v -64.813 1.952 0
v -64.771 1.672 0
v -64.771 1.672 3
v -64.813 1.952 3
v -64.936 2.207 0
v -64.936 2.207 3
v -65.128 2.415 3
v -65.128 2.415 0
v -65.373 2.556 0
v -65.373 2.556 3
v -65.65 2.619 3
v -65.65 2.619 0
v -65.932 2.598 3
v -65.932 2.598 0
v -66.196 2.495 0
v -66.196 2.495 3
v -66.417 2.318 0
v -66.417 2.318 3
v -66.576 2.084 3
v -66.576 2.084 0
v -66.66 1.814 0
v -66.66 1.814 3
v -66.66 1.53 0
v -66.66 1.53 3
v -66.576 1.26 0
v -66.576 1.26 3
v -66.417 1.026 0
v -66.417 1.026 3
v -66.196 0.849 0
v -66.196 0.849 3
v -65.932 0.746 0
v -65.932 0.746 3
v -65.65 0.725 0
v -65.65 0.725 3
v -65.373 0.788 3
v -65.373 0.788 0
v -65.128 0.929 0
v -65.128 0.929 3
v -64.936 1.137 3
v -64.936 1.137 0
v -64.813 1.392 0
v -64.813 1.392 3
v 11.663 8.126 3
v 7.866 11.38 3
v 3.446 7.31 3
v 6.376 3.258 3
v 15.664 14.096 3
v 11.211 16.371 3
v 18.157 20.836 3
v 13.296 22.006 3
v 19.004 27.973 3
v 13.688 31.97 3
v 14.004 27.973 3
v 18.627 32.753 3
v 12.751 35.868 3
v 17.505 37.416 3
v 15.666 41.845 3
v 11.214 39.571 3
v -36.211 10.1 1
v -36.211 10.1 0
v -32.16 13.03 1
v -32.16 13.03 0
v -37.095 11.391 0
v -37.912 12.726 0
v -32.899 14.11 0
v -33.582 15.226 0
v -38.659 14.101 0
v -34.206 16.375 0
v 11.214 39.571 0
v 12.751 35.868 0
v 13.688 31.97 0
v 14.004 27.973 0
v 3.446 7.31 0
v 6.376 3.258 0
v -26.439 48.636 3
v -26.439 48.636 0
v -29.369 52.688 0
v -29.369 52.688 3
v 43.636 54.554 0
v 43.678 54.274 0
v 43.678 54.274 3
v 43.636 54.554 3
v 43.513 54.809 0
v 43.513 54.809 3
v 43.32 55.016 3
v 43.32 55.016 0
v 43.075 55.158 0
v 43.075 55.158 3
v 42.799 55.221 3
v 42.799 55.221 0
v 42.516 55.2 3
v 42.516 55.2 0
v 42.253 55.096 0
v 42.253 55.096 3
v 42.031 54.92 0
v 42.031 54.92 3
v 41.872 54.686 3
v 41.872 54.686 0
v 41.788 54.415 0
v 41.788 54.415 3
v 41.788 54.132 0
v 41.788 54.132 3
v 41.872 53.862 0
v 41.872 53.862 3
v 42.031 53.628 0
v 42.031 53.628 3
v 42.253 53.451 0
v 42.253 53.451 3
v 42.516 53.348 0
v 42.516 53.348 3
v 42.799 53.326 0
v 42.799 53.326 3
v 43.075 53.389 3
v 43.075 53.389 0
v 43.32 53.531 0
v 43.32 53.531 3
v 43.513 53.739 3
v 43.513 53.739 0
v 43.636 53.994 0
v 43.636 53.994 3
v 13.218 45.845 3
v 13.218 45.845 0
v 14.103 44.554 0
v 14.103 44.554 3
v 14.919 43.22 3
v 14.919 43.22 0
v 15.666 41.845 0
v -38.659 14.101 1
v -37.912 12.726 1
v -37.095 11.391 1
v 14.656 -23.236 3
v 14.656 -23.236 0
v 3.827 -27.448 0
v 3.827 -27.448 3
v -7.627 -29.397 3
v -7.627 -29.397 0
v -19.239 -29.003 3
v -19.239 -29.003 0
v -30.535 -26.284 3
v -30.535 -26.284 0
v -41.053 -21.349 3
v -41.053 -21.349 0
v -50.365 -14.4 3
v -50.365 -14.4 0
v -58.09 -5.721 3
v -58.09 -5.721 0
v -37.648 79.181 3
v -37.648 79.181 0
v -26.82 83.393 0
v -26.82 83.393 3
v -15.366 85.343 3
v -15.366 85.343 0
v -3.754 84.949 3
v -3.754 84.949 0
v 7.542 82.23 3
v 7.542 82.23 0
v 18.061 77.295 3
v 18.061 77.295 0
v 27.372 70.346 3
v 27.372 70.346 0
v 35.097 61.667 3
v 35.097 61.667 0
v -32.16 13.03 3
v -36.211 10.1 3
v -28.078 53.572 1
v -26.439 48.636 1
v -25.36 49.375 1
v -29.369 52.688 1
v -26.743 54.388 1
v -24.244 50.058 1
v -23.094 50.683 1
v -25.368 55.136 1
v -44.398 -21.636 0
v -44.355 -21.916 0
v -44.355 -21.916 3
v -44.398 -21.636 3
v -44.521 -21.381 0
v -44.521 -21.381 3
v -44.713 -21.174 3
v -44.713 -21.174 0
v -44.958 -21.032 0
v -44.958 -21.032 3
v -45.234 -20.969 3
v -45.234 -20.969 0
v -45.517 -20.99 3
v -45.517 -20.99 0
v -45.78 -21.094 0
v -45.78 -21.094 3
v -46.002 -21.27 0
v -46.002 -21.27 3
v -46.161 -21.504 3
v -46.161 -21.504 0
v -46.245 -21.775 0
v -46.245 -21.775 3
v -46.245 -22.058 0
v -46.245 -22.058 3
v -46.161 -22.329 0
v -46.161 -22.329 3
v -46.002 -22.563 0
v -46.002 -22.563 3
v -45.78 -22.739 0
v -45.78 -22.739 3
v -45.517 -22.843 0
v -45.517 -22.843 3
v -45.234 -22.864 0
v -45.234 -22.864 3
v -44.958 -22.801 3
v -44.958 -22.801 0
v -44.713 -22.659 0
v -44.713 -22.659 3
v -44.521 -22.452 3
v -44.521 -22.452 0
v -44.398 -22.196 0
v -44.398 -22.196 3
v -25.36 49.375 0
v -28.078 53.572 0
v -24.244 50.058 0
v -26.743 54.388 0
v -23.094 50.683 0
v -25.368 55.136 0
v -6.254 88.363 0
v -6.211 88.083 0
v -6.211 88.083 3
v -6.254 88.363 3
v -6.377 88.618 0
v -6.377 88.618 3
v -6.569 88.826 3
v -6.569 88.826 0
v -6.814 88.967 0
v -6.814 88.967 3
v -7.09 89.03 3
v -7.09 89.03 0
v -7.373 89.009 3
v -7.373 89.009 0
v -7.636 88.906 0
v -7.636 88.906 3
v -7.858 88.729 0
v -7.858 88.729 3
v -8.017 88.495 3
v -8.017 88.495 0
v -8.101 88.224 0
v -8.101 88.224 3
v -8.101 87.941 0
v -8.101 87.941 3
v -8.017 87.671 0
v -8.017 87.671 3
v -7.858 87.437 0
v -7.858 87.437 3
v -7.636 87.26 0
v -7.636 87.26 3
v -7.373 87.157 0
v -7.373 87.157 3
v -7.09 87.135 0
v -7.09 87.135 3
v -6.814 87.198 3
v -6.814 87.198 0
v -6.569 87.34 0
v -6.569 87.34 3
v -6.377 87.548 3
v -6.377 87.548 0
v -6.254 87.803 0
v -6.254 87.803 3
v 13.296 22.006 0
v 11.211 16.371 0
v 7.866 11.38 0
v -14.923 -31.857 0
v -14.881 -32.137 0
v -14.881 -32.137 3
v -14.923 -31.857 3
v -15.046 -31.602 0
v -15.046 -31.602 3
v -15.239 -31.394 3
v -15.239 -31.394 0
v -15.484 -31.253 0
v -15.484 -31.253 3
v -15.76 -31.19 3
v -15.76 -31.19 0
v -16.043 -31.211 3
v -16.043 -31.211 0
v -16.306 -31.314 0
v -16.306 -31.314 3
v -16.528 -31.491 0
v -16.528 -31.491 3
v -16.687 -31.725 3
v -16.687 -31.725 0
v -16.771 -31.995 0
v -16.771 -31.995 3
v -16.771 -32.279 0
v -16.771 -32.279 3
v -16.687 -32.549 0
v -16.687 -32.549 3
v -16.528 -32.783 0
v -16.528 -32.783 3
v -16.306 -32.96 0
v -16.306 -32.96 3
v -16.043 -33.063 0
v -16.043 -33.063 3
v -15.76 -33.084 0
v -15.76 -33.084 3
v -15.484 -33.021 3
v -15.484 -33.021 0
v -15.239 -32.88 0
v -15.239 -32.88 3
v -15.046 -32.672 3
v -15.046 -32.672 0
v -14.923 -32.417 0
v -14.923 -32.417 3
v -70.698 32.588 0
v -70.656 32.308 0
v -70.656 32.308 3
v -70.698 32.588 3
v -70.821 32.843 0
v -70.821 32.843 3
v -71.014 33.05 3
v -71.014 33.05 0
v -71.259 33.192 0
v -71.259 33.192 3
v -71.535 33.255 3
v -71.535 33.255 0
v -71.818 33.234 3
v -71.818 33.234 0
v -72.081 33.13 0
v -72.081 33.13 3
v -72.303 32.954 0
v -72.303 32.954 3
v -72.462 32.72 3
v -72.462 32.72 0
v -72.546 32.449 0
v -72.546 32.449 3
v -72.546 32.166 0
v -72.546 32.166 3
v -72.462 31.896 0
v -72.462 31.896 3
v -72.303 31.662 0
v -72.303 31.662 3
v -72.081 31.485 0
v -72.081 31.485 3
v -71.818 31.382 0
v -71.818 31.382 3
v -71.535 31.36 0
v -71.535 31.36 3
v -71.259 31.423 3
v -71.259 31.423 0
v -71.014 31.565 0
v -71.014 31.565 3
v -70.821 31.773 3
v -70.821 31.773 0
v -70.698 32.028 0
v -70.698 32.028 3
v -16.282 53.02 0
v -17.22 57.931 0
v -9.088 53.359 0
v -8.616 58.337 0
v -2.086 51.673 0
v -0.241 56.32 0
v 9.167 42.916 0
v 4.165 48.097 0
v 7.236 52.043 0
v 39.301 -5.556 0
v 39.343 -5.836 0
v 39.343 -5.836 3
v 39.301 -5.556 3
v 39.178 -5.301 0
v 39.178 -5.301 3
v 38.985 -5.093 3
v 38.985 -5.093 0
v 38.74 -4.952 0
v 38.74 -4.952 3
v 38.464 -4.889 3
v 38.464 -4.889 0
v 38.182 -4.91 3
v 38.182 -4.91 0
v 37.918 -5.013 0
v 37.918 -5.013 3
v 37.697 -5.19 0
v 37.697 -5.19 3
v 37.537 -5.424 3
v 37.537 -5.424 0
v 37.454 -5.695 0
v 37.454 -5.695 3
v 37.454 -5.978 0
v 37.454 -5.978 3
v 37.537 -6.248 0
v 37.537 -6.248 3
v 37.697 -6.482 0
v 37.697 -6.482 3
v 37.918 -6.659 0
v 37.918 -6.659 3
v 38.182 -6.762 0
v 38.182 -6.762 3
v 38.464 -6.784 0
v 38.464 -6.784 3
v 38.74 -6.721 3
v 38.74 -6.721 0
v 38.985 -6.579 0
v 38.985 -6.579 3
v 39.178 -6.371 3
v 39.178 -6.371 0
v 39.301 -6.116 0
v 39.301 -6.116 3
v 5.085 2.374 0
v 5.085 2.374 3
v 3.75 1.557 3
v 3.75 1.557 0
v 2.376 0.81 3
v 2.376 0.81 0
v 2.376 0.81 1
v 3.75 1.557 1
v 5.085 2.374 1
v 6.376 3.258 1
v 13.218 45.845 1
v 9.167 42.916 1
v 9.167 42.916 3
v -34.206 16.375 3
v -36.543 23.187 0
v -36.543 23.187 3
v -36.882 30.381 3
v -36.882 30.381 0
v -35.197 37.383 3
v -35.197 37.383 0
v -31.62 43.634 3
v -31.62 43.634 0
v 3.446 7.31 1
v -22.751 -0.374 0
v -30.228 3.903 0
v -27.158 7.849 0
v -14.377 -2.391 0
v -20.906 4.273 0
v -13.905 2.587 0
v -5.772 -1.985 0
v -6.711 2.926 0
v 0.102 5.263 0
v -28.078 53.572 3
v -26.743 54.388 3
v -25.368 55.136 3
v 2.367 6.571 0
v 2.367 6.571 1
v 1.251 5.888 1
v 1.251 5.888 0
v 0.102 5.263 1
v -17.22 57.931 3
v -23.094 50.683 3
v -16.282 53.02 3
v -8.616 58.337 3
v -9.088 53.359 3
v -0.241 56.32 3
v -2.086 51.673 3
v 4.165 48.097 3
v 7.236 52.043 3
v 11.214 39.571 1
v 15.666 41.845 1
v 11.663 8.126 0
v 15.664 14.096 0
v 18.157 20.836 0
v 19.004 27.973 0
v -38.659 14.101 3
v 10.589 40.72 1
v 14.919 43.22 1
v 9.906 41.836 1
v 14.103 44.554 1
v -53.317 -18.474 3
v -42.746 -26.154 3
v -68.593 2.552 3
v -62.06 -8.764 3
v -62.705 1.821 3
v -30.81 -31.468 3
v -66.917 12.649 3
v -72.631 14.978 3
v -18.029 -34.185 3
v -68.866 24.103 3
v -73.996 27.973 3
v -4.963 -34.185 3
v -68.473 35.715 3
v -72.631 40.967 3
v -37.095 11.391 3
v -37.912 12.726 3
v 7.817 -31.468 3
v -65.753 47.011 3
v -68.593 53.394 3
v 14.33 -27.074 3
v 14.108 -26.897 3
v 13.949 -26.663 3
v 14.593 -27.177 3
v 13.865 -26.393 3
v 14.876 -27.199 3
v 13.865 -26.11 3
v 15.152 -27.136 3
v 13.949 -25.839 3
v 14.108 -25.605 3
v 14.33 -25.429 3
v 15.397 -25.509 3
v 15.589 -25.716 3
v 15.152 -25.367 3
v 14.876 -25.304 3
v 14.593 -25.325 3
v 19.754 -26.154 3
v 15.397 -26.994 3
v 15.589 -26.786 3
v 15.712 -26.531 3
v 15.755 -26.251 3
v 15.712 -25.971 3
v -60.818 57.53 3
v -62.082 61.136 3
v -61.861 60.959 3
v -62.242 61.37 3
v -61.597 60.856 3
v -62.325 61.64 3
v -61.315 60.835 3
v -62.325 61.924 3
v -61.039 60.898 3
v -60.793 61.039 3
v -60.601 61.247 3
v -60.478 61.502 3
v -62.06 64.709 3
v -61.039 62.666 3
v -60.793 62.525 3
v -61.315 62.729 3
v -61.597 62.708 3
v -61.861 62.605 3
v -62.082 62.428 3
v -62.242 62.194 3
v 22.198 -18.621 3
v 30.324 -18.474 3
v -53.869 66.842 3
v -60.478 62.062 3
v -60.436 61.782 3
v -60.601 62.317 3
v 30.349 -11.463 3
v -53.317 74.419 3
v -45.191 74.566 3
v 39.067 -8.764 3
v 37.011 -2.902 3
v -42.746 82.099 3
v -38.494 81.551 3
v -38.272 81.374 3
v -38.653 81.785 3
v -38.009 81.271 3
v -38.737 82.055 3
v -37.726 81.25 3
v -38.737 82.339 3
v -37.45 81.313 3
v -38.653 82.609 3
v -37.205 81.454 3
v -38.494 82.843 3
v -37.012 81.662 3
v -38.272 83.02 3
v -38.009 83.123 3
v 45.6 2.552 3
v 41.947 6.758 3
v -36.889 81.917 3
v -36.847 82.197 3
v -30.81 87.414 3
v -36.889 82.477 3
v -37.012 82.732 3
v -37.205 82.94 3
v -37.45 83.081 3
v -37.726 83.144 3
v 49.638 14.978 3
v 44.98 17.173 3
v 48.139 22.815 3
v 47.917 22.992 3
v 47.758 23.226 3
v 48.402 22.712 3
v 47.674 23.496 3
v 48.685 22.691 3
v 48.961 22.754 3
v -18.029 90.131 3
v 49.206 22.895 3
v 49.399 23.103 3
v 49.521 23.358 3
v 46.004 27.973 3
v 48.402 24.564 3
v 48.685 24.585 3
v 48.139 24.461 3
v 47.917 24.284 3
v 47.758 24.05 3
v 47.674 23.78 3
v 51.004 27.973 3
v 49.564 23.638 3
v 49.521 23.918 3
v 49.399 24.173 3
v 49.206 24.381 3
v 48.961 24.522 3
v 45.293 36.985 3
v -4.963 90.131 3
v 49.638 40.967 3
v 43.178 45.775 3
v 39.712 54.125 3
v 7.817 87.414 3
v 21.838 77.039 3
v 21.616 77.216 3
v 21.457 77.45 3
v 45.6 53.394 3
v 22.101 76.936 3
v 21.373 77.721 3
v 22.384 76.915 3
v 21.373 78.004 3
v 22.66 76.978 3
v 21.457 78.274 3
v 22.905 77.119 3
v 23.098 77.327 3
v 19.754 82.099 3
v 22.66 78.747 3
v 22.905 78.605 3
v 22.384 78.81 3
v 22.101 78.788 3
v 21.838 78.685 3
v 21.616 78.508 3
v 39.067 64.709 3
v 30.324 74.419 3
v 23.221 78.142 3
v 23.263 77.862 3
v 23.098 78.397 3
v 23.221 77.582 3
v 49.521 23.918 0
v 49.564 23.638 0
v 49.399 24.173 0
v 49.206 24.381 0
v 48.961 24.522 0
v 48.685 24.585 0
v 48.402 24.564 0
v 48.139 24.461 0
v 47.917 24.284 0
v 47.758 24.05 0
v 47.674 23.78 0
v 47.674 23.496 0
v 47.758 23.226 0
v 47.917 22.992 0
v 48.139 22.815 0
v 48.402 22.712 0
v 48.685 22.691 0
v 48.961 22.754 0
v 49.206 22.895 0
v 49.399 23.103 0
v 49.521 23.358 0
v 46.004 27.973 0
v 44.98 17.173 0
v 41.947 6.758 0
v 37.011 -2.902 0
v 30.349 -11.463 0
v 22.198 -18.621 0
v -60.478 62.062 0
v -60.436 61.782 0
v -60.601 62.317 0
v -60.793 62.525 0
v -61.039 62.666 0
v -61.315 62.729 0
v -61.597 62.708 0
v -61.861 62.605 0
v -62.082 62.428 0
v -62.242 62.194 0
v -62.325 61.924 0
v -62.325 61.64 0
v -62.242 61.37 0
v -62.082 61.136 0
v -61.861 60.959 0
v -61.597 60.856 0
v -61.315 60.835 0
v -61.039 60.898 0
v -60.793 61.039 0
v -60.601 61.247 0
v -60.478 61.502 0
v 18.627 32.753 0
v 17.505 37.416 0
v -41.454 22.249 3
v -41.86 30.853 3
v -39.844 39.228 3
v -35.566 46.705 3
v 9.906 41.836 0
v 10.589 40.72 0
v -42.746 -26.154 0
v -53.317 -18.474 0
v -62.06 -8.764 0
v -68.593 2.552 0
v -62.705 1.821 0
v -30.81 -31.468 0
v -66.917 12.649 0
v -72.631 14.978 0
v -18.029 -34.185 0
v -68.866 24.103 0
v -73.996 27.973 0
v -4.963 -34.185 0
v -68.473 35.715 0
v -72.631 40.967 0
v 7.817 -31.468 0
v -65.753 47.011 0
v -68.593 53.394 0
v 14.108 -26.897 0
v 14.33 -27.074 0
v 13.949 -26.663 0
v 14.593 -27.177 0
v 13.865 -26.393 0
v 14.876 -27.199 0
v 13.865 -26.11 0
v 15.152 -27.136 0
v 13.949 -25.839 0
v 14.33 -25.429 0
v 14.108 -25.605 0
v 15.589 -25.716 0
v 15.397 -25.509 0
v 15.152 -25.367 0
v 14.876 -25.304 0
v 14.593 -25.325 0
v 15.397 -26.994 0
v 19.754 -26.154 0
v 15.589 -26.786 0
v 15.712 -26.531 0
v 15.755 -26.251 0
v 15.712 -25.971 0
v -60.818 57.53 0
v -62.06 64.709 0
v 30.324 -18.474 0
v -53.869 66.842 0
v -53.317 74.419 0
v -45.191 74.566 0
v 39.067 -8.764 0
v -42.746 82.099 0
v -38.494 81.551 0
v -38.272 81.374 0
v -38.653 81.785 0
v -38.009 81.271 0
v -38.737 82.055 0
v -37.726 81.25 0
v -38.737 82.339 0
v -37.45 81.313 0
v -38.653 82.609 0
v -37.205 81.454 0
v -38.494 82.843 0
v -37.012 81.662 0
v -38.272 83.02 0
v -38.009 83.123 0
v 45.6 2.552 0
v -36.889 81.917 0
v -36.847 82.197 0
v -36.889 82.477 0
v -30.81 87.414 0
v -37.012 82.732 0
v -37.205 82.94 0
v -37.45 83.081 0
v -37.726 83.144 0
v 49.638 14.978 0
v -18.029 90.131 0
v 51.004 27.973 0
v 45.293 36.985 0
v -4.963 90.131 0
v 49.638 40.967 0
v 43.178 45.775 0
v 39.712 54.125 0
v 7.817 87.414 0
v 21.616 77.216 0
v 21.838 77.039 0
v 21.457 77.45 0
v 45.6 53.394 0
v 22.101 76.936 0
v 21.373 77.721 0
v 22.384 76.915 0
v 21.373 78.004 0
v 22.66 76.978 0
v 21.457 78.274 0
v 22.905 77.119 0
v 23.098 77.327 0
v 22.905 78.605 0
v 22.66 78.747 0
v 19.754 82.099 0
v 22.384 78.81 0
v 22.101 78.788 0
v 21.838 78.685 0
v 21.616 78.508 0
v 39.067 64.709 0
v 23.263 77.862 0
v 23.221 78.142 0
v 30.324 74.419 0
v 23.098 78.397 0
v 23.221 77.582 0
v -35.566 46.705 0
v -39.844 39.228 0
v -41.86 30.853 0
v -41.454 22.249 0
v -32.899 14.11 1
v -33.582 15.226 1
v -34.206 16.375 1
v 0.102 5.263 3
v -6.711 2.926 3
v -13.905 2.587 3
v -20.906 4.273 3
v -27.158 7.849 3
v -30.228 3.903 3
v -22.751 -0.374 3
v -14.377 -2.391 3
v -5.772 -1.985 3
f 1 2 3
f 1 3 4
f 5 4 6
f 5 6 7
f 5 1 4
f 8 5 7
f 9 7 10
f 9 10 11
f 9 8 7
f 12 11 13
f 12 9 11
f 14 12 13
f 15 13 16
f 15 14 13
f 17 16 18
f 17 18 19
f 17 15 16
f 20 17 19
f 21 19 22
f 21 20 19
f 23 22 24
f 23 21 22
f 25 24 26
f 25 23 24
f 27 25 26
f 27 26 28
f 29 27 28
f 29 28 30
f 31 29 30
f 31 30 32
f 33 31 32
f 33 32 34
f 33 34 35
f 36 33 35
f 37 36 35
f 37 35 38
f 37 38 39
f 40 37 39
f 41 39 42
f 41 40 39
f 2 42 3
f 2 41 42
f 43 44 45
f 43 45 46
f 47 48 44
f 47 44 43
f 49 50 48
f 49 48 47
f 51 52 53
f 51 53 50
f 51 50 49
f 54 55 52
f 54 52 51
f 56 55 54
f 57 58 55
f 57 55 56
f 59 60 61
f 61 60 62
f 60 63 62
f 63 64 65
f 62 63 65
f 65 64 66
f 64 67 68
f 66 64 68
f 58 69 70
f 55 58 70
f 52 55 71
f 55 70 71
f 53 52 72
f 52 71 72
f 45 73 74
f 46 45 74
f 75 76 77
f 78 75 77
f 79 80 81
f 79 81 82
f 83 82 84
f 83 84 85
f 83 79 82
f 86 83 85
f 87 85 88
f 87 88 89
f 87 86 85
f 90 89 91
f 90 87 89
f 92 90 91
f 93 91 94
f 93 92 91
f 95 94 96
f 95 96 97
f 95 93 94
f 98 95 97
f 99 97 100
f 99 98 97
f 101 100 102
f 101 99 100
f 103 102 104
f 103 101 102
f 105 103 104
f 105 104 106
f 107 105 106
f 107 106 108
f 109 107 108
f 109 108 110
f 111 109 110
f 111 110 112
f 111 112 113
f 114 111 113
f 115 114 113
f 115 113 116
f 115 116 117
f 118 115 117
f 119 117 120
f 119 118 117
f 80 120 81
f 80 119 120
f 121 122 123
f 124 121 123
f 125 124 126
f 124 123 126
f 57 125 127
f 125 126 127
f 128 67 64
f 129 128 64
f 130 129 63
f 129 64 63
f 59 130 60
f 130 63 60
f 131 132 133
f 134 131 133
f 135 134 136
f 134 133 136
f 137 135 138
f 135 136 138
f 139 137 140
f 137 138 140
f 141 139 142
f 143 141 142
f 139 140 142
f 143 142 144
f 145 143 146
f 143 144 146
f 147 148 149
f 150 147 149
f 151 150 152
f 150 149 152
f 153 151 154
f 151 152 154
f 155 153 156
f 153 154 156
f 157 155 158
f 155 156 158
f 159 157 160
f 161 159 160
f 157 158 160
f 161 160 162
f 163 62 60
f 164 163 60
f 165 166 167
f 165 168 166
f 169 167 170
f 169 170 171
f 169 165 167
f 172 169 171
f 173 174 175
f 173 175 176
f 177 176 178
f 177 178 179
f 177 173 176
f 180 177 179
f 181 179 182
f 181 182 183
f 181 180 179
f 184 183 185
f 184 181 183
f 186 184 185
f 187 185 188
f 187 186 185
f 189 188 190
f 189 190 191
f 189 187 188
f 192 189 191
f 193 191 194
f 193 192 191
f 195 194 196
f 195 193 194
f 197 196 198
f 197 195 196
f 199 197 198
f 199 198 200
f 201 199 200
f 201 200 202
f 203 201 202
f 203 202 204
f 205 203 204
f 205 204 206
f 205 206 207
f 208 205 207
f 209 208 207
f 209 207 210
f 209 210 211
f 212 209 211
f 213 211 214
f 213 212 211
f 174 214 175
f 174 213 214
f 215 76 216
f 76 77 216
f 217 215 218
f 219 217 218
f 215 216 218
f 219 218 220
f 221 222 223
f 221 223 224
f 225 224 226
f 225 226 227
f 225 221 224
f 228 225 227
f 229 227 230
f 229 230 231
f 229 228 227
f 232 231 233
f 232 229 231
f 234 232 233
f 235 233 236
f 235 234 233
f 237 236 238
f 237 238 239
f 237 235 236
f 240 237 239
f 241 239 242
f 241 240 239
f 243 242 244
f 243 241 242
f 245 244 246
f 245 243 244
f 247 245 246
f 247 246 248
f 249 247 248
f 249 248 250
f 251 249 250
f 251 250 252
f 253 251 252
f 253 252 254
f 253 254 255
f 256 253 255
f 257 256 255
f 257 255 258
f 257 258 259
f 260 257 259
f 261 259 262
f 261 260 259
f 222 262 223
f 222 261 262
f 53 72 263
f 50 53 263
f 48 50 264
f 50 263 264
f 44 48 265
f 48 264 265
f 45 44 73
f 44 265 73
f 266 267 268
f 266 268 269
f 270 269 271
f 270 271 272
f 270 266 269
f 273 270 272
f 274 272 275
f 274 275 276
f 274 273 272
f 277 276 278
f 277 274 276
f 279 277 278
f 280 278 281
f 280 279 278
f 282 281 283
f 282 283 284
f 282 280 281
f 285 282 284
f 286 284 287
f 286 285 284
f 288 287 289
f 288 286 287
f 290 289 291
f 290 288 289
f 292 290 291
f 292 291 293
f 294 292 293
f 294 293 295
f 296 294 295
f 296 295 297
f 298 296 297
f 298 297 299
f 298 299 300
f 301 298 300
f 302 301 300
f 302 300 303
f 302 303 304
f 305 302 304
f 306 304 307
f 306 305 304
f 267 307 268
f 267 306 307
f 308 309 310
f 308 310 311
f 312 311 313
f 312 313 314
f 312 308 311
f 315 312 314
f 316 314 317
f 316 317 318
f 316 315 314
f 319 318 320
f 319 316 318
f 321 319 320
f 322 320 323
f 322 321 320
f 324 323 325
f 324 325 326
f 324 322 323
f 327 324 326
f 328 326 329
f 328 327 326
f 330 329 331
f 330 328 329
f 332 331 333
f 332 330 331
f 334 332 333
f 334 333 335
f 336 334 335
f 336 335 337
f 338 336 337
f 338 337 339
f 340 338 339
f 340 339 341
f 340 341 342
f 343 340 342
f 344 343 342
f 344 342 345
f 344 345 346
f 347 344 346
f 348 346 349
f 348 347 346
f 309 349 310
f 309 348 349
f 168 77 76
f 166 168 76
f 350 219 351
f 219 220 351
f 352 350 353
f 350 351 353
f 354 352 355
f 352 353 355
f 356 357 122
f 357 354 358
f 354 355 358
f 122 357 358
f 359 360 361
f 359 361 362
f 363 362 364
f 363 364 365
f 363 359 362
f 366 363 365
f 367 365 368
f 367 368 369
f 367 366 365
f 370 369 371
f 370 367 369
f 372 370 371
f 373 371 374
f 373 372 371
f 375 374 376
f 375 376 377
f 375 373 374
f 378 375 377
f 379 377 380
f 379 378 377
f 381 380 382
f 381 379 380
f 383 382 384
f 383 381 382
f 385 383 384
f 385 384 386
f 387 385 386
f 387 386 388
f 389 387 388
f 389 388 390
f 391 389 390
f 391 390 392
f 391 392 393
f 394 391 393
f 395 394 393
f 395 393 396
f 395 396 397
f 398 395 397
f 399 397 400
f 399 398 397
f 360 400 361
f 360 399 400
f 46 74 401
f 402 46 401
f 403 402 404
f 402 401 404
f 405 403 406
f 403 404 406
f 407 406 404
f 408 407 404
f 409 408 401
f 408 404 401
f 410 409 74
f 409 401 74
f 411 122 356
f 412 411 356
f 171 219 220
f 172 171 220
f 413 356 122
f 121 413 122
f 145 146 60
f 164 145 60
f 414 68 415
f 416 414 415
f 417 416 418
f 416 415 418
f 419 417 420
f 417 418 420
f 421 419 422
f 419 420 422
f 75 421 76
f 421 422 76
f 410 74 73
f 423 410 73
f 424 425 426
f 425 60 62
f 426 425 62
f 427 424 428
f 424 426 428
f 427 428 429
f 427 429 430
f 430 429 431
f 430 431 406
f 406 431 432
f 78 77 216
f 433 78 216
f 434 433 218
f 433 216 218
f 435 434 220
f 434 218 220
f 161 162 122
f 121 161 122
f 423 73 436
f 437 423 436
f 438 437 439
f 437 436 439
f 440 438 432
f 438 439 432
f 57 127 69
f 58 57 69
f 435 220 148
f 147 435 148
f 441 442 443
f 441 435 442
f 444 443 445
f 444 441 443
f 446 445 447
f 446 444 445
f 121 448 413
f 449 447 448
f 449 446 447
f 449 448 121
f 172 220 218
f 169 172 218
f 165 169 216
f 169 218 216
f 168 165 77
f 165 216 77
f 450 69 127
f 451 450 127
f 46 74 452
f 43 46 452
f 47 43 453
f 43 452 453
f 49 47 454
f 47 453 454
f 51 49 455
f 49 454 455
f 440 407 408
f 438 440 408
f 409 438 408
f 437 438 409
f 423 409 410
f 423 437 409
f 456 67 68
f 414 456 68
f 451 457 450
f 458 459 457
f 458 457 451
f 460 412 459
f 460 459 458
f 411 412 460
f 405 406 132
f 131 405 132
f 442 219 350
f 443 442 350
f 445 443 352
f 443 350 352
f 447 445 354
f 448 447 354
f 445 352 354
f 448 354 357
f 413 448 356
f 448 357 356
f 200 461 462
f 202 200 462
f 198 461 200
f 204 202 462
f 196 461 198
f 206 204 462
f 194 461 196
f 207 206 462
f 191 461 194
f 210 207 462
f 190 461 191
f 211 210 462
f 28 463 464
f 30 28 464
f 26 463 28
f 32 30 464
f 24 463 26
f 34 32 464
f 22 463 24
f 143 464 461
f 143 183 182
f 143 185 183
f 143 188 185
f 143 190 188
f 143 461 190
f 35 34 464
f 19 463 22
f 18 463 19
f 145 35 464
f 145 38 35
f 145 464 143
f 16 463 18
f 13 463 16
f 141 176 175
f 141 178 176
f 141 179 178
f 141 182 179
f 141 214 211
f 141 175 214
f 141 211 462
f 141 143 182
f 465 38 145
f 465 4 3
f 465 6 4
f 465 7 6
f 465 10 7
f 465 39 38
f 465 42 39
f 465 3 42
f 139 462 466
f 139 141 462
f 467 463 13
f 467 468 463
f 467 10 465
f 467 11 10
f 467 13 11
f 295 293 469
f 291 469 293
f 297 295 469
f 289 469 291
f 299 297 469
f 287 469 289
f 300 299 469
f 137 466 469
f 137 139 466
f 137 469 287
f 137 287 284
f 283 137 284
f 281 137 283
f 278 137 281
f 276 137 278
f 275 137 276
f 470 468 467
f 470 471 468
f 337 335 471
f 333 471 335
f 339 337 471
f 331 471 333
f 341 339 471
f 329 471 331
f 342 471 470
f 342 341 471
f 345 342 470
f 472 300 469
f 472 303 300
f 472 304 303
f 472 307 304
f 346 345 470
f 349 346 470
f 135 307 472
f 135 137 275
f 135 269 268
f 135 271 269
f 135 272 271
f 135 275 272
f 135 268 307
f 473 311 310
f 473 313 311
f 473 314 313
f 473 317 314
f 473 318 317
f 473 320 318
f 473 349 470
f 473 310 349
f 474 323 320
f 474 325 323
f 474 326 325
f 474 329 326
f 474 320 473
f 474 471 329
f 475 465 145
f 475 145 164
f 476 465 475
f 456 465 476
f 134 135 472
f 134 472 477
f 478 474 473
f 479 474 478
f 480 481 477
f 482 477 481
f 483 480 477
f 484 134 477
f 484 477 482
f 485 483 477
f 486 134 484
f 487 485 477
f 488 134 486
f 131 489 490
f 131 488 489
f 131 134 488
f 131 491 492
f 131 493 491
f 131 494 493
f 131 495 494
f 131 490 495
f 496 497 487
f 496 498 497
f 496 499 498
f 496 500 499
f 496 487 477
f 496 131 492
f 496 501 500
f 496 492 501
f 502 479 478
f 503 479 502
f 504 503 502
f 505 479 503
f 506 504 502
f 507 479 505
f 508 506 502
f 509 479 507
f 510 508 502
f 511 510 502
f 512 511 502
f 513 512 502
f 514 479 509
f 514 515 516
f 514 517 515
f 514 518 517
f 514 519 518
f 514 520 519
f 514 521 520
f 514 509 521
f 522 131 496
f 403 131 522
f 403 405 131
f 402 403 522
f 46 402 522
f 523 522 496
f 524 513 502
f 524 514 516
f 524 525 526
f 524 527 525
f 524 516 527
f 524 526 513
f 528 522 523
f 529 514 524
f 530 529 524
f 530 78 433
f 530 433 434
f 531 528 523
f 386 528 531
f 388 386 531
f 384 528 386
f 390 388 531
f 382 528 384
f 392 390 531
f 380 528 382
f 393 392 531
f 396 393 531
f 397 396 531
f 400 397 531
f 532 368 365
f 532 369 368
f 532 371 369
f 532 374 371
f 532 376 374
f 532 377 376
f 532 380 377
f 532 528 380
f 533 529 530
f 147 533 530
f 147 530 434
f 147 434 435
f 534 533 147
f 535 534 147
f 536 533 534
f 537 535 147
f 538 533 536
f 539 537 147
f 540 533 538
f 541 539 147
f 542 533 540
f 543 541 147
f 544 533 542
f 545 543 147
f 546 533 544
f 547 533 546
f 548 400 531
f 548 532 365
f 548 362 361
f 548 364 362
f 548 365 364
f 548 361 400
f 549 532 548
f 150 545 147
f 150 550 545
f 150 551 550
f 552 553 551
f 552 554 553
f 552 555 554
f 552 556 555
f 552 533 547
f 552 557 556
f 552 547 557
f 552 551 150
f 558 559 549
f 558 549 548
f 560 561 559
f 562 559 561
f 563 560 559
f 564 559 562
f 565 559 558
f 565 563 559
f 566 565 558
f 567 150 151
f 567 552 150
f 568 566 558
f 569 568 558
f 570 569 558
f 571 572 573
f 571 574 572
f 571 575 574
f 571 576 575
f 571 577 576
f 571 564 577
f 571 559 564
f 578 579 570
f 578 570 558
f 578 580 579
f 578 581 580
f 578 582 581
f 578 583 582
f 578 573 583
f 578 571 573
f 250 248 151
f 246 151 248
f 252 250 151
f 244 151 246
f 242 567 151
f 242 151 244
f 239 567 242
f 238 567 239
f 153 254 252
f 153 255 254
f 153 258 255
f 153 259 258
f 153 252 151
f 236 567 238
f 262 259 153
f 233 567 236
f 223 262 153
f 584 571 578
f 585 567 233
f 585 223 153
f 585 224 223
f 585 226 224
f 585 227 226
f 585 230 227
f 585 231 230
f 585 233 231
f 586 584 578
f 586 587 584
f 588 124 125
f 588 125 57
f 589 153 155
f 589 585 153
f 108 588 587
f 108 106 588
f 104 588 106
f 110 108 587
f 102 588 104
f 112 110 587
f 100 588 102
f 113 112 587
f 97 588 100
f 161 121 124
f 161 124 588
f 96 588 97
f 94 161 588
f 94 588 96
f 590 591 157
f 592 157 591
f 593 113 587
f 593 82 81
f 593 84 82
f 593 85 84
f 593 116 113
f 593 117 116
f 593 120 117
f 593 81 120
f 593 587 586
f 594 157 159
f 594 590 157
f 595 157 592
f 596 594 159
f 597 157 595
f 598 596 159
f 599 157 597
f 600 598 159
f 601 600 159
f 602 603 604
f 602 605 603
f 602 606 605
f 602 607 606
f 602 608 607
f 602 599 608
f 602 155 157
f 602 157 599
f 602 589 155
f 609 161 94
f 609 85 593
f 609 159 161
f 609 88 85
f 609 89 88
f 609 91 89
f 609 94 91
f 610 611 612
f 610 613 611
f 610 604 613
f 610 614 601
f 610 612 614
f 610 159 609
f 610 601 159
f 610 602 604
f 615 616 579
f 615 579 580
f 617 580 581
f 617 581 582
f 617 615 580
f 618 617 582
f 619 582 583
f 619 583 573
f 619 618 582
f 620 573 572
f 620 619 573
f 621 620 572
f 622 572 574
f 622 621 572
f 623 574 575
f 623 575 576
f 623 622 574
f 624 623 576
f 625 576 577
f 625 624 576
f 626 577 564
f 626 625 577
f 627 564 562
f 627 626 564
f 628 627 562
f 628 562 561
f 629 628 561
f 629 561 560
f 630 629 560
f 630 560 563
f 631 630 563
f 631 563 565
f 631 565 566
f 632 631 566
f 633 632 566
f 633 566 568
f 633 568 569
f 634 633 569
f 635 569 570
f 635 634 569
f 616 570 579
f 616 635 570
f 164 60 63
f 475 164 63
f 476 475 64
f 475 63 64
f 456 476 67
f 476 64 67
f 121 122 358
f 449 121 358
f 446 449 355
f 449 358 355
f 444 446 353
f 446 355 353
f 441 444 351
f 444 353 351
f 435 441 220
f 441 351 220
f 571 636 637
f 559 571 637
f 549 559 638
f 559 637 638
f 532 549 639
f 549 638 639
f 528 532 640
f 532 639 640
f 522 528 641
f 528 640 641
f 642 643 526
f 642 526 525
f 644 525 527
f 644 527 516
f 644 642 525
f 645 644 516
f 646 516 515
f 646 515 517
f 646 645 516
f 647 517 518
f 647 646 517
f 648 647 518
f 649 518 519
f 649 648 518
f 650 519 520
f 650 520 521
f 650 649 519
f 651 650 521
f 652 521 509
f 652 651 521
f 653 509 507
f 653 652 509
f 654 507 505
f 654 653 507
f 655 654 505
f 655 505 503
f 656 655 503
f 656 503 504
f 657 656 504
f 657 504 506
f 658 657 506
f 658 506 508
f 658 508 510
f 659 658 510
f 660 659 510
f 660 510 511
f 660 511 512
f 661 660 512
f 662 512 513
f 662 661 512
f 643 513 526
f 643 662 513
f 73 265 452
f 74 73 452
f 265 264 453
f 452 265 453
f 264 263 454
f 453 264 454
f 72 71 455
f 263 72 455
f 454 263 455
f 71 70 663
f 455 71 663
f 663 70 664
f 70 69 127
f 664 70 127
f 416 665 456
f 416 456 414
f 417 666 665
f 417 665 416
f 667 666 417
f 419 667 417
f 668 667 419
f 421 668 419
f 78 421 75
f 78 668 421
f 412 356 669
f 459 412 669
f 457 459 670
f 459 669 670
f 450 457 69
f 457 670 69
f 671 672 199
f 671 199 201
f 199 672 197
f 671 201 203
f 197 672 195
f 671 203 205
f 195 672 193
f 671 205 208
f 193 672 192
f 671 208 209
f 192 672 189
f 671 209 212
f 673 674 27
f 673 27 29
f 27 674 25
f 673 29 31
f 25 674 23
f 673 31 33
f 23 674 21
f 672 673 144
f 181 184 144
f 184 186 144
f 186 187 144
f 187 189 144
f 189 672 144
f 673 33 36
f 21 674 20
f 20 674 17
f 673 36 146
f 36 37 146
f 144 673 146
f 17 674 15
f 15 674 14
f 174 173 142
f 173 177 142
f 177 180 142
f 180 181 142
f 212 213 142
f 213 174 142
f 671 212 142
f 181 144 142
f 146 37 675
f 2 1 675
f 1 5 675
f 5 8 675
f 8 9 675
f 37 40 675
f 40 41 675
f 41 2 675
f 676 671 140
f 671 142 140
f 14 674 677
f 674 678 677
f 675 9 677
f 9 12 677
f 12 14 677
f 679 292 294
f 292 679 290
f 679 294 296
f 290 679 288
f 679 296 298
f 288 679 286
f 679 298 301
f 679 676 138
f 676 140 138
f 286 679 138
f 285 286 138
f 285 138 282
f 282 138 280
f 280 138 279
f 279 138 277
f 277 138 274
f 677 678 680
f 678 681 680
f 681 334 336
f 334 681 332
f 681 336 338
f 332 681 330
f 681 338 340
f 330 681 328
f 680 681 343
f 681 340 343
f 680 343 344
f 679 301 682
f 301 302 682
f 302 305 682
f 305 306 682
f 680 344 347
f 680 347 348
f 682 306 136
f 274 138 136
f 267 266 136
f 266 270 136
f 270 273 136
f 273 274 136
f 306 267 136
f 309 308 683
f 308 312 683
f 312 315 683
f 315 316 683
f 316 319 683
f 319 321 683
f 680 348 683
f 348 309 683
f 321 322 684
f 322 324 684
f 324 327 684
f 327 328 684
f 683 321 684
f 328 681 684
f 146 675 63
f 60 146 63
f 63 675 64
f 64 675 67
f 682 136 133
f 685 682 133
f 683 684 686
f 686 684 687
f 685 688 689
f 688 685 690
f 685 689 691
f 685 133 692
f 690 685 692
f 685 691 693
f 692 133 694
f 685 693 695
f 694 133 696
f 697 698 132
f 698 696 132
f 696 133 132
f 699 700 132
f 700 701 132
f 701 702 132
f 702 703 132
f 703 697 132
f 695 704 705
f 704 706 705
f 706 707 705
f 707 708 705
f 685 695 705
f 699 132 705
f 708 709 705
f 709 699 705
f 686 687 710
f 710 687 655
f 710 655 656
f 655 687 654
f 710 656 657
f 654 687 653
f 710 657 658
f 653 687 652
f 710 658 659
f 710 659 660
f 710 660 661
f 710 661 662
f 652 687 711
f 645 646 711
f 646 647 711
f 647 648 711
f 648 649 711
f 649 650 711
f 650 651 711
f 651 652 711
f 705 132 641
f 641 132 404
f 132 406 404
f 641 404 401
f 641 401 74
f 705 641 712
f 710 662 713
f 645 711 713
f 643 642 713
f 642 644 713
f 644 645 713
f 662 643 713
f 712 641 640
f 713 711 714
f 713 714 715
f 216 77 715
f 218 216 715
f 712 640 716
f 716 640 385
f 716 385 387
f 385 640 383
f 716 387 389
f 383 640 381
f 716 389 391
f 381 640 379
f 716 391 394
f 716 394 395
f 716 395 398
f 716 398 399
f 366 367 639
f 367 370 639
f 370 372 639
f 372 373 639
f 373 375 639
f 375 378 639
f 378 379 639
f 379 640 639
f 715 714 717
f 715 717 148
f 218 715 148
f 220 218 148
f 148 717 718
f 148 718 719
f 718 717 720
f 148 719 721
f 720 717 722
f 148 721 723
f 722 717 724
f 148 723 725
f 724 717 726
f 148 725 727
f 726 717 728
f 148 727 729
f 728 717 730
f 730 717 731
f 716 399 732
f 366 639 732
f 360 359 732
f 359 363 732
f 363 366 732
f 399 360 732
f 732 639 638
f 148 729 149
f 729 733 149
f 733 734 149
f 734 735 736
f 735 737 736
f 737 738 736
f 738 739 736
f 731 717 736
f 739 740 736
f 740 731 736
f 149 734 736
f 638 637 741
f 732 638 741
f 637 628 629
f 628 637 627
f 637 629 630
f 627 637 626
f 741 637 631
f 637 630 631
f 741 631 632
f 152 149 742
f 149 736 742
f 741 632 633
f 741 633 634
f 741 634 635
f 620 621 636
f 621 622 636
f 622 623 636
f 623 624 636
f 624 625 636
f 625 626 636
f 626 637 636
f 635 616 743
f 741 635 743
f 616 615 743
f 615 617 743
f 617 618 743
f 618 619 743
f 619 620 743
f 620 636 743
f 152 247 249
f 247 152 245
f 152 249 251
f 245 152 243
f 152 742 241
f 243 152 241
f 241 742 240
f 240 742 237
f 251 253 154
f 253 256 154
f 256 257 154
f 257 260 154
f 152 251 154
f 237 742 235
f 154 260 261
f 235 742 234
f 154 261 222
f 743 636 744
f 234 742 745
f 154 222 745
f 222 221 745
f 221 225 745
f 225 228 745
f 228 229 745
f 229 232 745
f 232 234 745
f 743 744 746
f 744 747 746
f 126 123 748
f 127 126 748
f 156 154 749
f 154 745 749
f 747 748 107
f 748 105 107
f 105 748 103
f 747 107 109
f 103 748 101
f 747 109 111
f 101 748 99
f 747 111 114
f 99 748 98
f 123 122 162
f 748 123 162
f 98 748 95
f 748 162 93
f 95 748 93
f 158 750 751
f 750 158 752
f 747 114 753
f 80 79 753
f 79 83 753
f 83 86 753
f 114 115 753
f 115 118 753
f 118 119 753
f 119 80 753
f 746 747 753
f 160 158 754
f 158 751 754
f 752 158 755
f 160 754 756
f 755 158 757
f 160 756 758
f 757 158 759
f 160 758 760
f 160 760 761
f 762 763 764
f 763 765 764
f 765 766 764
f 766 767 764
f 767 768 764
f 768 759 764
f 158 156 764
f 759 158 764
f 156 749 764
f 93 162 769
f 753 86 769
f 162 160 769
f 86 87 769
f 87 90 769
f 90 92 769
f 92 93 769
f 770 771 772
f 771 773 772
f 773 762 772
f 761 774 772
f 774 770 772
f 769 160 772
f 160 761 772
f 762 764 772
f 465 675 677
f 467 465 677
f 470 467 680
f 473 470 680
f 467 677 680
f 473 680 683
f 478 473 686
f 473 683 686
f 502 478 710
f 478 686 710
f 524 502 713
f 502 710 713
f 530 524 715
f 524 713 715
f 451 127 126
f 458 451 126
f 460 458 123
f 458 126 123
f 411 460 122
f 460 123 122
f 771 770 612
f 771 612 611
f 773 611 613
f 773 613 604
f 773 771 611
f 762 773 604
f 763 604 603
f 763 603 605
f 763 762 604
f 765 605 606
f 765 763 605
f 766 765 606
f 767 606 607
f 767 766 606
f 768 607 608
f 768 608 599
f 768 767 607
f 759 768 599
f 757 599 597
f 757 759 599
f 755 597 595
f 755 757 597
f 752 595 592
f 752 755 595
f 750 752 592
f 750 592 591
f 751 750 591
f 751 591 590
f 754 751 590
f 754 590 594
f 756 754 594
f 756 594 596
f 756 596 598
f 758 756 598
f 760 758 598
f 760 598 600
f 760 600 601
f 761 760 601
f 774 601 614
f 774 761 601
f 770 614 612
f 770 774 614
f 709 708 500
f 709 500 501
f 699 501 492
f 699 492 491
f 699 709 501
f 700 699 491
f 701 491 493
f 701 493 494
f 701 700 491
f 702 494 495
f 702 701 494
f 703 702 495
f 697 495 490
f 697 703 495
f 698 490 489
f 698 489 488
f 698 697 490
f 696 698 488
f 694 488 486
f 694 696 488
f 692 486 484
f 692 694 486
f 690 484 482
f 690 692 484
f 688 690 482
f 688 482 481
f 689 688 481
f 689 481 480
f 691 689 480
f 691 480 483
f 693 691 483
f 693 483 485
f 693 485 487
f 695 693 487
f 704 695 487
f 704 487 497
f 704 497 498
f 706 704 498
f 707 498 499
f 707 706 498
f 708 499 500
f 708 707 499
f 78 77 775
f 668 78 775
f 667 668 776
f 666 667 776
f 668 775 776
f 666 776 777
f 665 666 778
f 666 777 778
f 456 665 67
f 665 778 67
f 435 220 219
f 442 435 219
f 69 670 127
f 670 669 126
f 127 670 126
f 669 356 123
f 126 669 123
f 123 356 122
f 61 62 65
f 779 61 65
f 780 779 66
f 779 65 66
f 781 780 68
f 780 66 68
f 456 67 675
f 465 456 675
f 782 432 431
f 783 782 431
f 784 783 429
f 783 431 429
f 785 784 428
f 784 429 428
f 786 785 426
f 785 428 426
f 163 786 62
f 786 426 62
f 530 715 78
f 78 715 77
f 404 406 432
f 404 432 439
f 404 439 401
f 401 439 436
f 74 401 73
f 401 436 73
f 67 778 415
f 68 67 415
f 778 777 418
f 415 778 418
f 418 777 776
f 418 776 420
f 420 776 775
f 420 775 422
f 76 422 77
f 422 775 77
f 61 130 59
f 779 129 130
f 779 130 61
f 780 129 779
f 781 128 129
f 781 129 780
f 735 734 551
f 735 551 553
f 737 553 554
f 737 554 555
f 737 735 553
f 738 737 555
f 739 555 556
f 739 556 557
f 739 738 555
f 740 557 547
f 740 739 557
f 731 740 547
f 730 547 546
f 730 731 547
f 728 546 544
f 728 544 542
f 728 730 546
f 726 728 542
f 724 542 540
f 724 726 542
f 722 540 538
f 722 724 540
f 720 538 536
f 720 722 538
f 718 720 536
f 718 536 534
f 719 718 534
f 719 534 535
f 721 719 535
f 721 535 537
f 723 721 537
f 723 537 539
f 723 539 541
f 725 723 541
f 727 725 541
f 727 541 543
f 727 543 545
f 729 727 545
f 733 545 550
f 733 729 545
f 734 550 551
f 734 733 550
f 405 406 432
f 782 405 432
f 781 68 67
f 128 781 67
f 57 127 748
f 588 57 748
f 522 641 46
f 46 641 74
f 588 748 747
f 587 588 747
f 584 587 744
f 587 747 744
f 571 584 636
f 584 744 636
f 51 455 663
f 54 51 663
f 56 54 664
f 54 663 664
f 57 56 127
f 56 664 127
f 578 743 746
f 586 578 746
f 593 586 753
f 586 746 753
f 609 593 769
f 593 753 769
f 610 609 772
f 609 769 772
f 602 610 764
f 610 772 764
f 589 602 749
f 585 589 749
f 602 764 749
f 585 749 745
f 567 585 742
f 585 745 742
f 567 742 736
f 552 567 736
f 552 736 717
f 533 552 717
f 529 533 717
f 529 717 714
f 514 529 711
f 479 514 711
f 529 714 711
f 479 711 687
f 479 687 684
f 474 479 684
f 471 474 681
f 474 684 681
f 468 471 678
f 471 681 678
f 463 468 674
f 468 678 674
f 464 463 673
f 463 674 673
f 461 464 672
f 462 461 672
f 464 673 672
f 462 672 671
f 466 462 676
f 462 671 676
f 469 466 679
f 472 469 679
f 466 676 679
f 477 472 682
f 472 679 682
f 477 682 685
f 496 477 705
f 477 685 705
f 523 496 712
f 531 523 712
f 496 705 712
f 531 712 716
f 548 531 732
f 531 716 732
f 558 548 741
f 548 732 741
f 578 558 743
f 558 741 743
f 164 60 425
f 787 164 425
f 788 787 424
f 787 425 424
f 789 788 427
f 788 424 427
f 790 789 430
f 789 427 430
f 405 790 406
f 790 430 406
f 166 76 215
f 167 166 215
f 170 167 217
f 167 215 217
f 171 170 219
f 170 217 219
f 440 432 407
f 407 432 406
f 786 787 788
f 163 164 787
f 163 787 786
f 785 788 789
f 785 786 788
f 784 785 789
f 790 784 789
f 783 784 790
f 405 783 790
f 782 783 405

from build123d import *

# Parameters (mm, degrees)
F0_R     = 62.5
F0_R_2   = 0.95
F1_DEPTH = 3
F2_DEPTH = 1


with BuildPart() as f1:
    # F0 (on Top) → F1 (new body)
    with BuildSketch(Plane.XY):
        with Locations((-11.4963501692, 27.9728826135)):
            Circle(F0_R)
        with Locations((-45.3054299303, -21.9164186971)):
            Circle(F0_R_2, mode=Mode.SUBTRACT)
        with Locations((-15.8312214656, -32.1370595791)):
            Circle(F0_R_2, mode=Mode.SUBTRACT)
        with Locations((-65.7205227762, 1.672020182)):
            Circle(F0_R_2, mode=Mode.SUBTRACT)
        with Locations((14.8045122623, -26.2512899935)):
            Circle(F0_R_2, mode=Mode.SUBTRACT)
        with Locations((38.3929511415, -5.8361971476)):
            Circle(F0_R_2, mode=Mode.SUBTRACT)
        with Locations((48.6135920235, 23.6380113171)):
            Circle(F0_R_2, mode=Mode.SUBTRACT)
        with Locations((-71.6062923619, 32.3077539099)):
            Circle(F0_R_2, mode=Mode.SUBTRACT)
        with Locations((-61.3856514799, 61.7819623747)):
            Circle(F0_R_2, mode=Mode.SUBTRACT)
        with Locations((-37.7972126007, 82.1970552206)):
            Circle(F0_R_2, mode=Mode.SUBTRACT)
        with BuildLine():
            ThreePointArc((35.0970928529, 61.6671116053), (37.5498519583, 57.9848811619), (39.7122301293, 54.1249629097))
            ThreePointArc((39.7122301293, 54.1249629097), (44.4086736085, 41.4219835656), (46.0036498308, 27.9728826135))
            ThreePointArc((46.0036498308, 27.9728826135), (39.707498158, 1.8115386785), (22.1978788226, -18.6205604085))
            ThreePointArc((22.1978788226, -18.6205604085), (18.5156483792, -21.073319514), (14.655730127, -23.2356976849))
            ThreePointArc((14.655730127, -23.2356976849), (-24.9555645945, -27.9297071928), (-58.0897931912, -5.7213463782))
            ThreePointArc((-58.0897931912, -5.7213463782), (-60.5425522967, -2.0391159348), (-62.7049304676, 1.8208023173))
            ThreePointArc((-62.7049304676, 1.8208023173), (-67.3989399755, 41.4320970388), (-45.190579161, 74.5663256356))
            ThreePointArc((-45.190579161, 74.5663256356), (-41.5083487176, 77.019084741), (-37.6484304654, 79.181462912))
            ThreePointArc((-37.6484304654, 79.181462912), (1.9628642561, 83.8754724199), (35.0970928529, 61.6671116053))
        make_face(mode=Mode.SUBTRACT)
        with Locations((42.7278224379, 54.2737450451)):
            Circle(F0_R_2, mode=Mode.SUBTRACT)
        with Locations((-7.1614788728, 88.0828248062)):
            Circle(F0_R_2, mode=Mode.SUBTRACT)
        with Locations((22.312729592, 77.8621839242)):
            Circle(F0_R_2, mode=Mode.SUBTRACT)
        with BuildLine():
            ThreePointArc((13.2184326512, 45.845473644), (14.5194613941, 43.8922905392), (15.6664619891, 41.8448556402))
            Line((15.6664619891, 41.8448556402), (39.7122301293, 54.1249629097))
            ThreePointArc((39.7122301293, 54.1249629097), (37.5498519583, 57.9848811619), (35.0970928529, 61.6671116053))
            Line((35.0970928529, 61.6671116053), (13.2184326512, 45.845473644))
        make_face()
        with BuildLine():
            ThreePointArc((-29.3689411996, 52.6876654339), (-27.4157580948, 53.9886941768), (-25.3683231959, 55.1356947718))
            Line((-25.3683231959, 55.1356947718), (-37.6484304654, 79.181462912))
            ThreePointArc((-37.6484304654, 79.181462912), (-41.5083487176, 77.019084741), (-45.190579161, 74.5663256356))
            Line((-45.190579161, 74.5663256356), (-29.3689411996, 52.6876654339))
        make_face()
        with BuildLine():
            Line((22.1978788226, -18.6205604085), (6.3762408612, 3.2580997931))
            ThreePointArc((6.3762408612, 3.2580997931), (4.4230577565, 1.9570710503), (2.3756228575, 0.8100704552))
            Line((2.3756228575, 0.8100704552), (14.655730127, -23.2356976849))
            ThreePointArc((14.655730127, -23.2356976849), (18.5156483792, -21.073319514), (22.1978788226, -18.6205604085))
        make_face()
        with BuildLine():
            Line((-58.0897931912, -5.7213463782), (-36.2111329896, 10.1002915831))
            ThreePointArc((-36.2111329896, 10.1002915831), (-37.5121617325, 12.0534746879), (-38.6591623275, 14.1009095869))
            Line((-38.6591623275, 14.1009095869), (-62.7049304676, 1.8208023173))
            ThreePointArc((-62.7049304676, 1.8208023173), (-60.5425522967, -2.0391159348), (-58.0897931912, -5.7213463782))
        make_face()
    extrude(amount=F1_DEPTH)


with BuildPart() as f1b:
    # F0 (on Top) → F1, piece 2 (new body)
    with BuildSketch(Plane.XY):
        with BuildLine():
            ThreePointArc((-23.0942292571, 50.6827747459), (-5.5274811632, 52.764465919), (9.1668289102, 42.9155406882))
            Line((9.1668289102, 42.9155406882), (13.2184326512, 45.845473644))
            ThreePointArc((13.2184326512, 45.845473644), (-4.3571146914, 57.6255606847), (-25.3683231959, 55.1356947718))
            Line((-25.3683231959, 55.1356947718), (-23.0942292571, 50.6827747459))
        make_face()
    extrude(amount=F1_DEPTH)


with BuildPart() as f1c:
    # F0 (on Top) → F1, piece 3 (new body)
    with BuildSketch(Plane.XY):
        with BuildLine():
            ThreePointArc((-34.2062423015, 16.3750035257), (-36.2879334746, 33.9417516195), (-26.4390082438, 48.6360616929))
            Line((-26.4390082438, 48.6360616929), (-29.3689411996, 52.6876654339))
            ThreePointArc((-29.3689411996, 52.6876654339), (-41.1490282404, 35.1121180913), (-38.6591623275, 14.1009095869))
            Line((-38.6591623275, 14.1009095869), (-34.2062423015, 16.3750035257))
        make_face()
    extrude(amount=F1_DEPTH)


with BuildPart() as f1d:
    # F0 (on Top) → F1, piece 4 (new body)
    with BuildSketch(Plane.XY):
        with BuildLine():
            Line((2.3756228575, 0.8100704552), (0.1015289187, 5.2629904812))
            ThreePointArc((0.1015289187, 5.2629904812), (-17.4652191752, 3.1812993081), (-32.1595292485, 13.0302245389))
            Line((-32.1595292485, 13.0302245389), (-36.2111329896, 10.1002915831))
            ThreePointArc((-36.2111329896, 10.1002915831), (-18.6355856469, -1.6797954576), (2.3756228575, 0.8100704552))
        make_face()
    extrude(amount=F1_DEPTH)


with BuildPart() as f1e:
    # F0 (on Top) → F1, piece 5 (new body)
    with BuildSketch(Plane.XY):
        with BuildLine():
            ThreePointArc((11.2135419632, 39.5707617014), (13.2963125496, 33.937266514), (14.0036498308, 27.9728826135))
            ThreePointArc((14.0036498308, 27.9728826135), (11.2114434368, 16.3708953032), (3.4463079054, 7.3097035342))
            Line((3.4463079054, 7.3097035342), (6.3762408612, 3.2580997931))
            ThreePointArc((6.3762408612, 3.2580997931), (15.663951987, 14.0959958306), (19.0036498308, 27.9728826135))
            ThreePointArc((19.0036498308, 27.9728826135), (18.1576189651, 35.1067535534), (15.6664619891, 41.8448556402))
            Line((15.6664619891, 41.8448556402), (11.2135419632, 39.5707617014))
        make_face()
    extrude(amount=F1_DEPTH)


with BuildPart() as f2:
    # F0 (on Top) → F2 (new body)
    with BuildSketch(Plane.XY):
        with BuildLine():
            ThreePointArc((-26.4390082438, 48.6360616929), (-24.8060190906, 49.7238070353), (-23.0942292571, 50.6827747459))
            Line((-23.0942292571, 50.6827747459), (-25.3683231959, 55.1356947718))
            ThreePointArc((-25.3683231959, 55.1356947718), (-27.4157580948, 53.9886941768), (-29.3689411996, 52.6876654339))
            Line((-29.3689411996, 52.6876654339), (-26.4390082438, 48.6360616929))
        make_face()
    extrude(amount=F2_DEPTH)


with BuildPart() as f2b:
    # F0 (on Top) → F2, piece 2 (new body)
    with BuildSketch(Plane.XY):
        with BuildLine():
            Line((-36.2111329896, 10.1002915831), (-32.1595292485, 13.0302245389))
            ThreePointArc((-32.1595292485, 13.0302245389), (-33.2472745909, 14.6632136921), (-34.2062423015, 16.3750035257))
            Line((-34.2062423015, 16.3750035257), (-38.6591623275, 14.1009095869))
            ThreePointArc((-38.6591623275, 14.1009095869), (-37.5121617325, 12.0534746879), (-36.2111329896, 10.1002915831))
        make_face()
    extrude(amount=F2_DEPTH)


with BuildPart() as f2c:
    # F0 (on Top) → F2, piece 3 (new body)
    with BuildSketch(Plane.XY):
        with BuildLine():
            Line((6.3762408612, 3.2580997931), (3.4463079054, 7.3097035342))
            ThreePointArc((3.4463079054, 7.3097035342), (1.8133187523, 6.2219581918), (0.1015289187, 5.2629904812))
            Line((0.1015289187, 5.2629904812), (2.3756228575, 0.8100704552))
            ThreePointArc((2.3756228575, 0.8100704552), (4.4230577565, 1.9570710503), (6.3762408612, 3.2580997931))
        make_face()
    extrude(amount=F2_DEPTH)


with BuildPart() as f2d:
    # F0 (on Top) → F2, piece 4 (new body)
    with BuildSketch(Plane.XY):
        with BuildLine():
            ThreePointArc((9.1668289102, 42.9155406882), (10.2545742526, 41.282551535), (11.2135419632, 39.5707617014))
            Line((11.2135419632, 39.5707617014), (15.6664619891, 41.8448556402))
            ThreePointArc((15.6664619891, 41.8448556402), (14.5194613941, 43.8922905392), (13.2184326512, 45.845473644))
            Line((13.2184326512, 45.845473644), (9.1668289102, 42.9155406882))
        make_face()
    extrude(amount=F2_DEPTH)


solid = Compound([f1.part, f1b.part, f1c.part, f1d.part, f1e.part, f2.part, f2b.part, f2c.part, f2d.part])
